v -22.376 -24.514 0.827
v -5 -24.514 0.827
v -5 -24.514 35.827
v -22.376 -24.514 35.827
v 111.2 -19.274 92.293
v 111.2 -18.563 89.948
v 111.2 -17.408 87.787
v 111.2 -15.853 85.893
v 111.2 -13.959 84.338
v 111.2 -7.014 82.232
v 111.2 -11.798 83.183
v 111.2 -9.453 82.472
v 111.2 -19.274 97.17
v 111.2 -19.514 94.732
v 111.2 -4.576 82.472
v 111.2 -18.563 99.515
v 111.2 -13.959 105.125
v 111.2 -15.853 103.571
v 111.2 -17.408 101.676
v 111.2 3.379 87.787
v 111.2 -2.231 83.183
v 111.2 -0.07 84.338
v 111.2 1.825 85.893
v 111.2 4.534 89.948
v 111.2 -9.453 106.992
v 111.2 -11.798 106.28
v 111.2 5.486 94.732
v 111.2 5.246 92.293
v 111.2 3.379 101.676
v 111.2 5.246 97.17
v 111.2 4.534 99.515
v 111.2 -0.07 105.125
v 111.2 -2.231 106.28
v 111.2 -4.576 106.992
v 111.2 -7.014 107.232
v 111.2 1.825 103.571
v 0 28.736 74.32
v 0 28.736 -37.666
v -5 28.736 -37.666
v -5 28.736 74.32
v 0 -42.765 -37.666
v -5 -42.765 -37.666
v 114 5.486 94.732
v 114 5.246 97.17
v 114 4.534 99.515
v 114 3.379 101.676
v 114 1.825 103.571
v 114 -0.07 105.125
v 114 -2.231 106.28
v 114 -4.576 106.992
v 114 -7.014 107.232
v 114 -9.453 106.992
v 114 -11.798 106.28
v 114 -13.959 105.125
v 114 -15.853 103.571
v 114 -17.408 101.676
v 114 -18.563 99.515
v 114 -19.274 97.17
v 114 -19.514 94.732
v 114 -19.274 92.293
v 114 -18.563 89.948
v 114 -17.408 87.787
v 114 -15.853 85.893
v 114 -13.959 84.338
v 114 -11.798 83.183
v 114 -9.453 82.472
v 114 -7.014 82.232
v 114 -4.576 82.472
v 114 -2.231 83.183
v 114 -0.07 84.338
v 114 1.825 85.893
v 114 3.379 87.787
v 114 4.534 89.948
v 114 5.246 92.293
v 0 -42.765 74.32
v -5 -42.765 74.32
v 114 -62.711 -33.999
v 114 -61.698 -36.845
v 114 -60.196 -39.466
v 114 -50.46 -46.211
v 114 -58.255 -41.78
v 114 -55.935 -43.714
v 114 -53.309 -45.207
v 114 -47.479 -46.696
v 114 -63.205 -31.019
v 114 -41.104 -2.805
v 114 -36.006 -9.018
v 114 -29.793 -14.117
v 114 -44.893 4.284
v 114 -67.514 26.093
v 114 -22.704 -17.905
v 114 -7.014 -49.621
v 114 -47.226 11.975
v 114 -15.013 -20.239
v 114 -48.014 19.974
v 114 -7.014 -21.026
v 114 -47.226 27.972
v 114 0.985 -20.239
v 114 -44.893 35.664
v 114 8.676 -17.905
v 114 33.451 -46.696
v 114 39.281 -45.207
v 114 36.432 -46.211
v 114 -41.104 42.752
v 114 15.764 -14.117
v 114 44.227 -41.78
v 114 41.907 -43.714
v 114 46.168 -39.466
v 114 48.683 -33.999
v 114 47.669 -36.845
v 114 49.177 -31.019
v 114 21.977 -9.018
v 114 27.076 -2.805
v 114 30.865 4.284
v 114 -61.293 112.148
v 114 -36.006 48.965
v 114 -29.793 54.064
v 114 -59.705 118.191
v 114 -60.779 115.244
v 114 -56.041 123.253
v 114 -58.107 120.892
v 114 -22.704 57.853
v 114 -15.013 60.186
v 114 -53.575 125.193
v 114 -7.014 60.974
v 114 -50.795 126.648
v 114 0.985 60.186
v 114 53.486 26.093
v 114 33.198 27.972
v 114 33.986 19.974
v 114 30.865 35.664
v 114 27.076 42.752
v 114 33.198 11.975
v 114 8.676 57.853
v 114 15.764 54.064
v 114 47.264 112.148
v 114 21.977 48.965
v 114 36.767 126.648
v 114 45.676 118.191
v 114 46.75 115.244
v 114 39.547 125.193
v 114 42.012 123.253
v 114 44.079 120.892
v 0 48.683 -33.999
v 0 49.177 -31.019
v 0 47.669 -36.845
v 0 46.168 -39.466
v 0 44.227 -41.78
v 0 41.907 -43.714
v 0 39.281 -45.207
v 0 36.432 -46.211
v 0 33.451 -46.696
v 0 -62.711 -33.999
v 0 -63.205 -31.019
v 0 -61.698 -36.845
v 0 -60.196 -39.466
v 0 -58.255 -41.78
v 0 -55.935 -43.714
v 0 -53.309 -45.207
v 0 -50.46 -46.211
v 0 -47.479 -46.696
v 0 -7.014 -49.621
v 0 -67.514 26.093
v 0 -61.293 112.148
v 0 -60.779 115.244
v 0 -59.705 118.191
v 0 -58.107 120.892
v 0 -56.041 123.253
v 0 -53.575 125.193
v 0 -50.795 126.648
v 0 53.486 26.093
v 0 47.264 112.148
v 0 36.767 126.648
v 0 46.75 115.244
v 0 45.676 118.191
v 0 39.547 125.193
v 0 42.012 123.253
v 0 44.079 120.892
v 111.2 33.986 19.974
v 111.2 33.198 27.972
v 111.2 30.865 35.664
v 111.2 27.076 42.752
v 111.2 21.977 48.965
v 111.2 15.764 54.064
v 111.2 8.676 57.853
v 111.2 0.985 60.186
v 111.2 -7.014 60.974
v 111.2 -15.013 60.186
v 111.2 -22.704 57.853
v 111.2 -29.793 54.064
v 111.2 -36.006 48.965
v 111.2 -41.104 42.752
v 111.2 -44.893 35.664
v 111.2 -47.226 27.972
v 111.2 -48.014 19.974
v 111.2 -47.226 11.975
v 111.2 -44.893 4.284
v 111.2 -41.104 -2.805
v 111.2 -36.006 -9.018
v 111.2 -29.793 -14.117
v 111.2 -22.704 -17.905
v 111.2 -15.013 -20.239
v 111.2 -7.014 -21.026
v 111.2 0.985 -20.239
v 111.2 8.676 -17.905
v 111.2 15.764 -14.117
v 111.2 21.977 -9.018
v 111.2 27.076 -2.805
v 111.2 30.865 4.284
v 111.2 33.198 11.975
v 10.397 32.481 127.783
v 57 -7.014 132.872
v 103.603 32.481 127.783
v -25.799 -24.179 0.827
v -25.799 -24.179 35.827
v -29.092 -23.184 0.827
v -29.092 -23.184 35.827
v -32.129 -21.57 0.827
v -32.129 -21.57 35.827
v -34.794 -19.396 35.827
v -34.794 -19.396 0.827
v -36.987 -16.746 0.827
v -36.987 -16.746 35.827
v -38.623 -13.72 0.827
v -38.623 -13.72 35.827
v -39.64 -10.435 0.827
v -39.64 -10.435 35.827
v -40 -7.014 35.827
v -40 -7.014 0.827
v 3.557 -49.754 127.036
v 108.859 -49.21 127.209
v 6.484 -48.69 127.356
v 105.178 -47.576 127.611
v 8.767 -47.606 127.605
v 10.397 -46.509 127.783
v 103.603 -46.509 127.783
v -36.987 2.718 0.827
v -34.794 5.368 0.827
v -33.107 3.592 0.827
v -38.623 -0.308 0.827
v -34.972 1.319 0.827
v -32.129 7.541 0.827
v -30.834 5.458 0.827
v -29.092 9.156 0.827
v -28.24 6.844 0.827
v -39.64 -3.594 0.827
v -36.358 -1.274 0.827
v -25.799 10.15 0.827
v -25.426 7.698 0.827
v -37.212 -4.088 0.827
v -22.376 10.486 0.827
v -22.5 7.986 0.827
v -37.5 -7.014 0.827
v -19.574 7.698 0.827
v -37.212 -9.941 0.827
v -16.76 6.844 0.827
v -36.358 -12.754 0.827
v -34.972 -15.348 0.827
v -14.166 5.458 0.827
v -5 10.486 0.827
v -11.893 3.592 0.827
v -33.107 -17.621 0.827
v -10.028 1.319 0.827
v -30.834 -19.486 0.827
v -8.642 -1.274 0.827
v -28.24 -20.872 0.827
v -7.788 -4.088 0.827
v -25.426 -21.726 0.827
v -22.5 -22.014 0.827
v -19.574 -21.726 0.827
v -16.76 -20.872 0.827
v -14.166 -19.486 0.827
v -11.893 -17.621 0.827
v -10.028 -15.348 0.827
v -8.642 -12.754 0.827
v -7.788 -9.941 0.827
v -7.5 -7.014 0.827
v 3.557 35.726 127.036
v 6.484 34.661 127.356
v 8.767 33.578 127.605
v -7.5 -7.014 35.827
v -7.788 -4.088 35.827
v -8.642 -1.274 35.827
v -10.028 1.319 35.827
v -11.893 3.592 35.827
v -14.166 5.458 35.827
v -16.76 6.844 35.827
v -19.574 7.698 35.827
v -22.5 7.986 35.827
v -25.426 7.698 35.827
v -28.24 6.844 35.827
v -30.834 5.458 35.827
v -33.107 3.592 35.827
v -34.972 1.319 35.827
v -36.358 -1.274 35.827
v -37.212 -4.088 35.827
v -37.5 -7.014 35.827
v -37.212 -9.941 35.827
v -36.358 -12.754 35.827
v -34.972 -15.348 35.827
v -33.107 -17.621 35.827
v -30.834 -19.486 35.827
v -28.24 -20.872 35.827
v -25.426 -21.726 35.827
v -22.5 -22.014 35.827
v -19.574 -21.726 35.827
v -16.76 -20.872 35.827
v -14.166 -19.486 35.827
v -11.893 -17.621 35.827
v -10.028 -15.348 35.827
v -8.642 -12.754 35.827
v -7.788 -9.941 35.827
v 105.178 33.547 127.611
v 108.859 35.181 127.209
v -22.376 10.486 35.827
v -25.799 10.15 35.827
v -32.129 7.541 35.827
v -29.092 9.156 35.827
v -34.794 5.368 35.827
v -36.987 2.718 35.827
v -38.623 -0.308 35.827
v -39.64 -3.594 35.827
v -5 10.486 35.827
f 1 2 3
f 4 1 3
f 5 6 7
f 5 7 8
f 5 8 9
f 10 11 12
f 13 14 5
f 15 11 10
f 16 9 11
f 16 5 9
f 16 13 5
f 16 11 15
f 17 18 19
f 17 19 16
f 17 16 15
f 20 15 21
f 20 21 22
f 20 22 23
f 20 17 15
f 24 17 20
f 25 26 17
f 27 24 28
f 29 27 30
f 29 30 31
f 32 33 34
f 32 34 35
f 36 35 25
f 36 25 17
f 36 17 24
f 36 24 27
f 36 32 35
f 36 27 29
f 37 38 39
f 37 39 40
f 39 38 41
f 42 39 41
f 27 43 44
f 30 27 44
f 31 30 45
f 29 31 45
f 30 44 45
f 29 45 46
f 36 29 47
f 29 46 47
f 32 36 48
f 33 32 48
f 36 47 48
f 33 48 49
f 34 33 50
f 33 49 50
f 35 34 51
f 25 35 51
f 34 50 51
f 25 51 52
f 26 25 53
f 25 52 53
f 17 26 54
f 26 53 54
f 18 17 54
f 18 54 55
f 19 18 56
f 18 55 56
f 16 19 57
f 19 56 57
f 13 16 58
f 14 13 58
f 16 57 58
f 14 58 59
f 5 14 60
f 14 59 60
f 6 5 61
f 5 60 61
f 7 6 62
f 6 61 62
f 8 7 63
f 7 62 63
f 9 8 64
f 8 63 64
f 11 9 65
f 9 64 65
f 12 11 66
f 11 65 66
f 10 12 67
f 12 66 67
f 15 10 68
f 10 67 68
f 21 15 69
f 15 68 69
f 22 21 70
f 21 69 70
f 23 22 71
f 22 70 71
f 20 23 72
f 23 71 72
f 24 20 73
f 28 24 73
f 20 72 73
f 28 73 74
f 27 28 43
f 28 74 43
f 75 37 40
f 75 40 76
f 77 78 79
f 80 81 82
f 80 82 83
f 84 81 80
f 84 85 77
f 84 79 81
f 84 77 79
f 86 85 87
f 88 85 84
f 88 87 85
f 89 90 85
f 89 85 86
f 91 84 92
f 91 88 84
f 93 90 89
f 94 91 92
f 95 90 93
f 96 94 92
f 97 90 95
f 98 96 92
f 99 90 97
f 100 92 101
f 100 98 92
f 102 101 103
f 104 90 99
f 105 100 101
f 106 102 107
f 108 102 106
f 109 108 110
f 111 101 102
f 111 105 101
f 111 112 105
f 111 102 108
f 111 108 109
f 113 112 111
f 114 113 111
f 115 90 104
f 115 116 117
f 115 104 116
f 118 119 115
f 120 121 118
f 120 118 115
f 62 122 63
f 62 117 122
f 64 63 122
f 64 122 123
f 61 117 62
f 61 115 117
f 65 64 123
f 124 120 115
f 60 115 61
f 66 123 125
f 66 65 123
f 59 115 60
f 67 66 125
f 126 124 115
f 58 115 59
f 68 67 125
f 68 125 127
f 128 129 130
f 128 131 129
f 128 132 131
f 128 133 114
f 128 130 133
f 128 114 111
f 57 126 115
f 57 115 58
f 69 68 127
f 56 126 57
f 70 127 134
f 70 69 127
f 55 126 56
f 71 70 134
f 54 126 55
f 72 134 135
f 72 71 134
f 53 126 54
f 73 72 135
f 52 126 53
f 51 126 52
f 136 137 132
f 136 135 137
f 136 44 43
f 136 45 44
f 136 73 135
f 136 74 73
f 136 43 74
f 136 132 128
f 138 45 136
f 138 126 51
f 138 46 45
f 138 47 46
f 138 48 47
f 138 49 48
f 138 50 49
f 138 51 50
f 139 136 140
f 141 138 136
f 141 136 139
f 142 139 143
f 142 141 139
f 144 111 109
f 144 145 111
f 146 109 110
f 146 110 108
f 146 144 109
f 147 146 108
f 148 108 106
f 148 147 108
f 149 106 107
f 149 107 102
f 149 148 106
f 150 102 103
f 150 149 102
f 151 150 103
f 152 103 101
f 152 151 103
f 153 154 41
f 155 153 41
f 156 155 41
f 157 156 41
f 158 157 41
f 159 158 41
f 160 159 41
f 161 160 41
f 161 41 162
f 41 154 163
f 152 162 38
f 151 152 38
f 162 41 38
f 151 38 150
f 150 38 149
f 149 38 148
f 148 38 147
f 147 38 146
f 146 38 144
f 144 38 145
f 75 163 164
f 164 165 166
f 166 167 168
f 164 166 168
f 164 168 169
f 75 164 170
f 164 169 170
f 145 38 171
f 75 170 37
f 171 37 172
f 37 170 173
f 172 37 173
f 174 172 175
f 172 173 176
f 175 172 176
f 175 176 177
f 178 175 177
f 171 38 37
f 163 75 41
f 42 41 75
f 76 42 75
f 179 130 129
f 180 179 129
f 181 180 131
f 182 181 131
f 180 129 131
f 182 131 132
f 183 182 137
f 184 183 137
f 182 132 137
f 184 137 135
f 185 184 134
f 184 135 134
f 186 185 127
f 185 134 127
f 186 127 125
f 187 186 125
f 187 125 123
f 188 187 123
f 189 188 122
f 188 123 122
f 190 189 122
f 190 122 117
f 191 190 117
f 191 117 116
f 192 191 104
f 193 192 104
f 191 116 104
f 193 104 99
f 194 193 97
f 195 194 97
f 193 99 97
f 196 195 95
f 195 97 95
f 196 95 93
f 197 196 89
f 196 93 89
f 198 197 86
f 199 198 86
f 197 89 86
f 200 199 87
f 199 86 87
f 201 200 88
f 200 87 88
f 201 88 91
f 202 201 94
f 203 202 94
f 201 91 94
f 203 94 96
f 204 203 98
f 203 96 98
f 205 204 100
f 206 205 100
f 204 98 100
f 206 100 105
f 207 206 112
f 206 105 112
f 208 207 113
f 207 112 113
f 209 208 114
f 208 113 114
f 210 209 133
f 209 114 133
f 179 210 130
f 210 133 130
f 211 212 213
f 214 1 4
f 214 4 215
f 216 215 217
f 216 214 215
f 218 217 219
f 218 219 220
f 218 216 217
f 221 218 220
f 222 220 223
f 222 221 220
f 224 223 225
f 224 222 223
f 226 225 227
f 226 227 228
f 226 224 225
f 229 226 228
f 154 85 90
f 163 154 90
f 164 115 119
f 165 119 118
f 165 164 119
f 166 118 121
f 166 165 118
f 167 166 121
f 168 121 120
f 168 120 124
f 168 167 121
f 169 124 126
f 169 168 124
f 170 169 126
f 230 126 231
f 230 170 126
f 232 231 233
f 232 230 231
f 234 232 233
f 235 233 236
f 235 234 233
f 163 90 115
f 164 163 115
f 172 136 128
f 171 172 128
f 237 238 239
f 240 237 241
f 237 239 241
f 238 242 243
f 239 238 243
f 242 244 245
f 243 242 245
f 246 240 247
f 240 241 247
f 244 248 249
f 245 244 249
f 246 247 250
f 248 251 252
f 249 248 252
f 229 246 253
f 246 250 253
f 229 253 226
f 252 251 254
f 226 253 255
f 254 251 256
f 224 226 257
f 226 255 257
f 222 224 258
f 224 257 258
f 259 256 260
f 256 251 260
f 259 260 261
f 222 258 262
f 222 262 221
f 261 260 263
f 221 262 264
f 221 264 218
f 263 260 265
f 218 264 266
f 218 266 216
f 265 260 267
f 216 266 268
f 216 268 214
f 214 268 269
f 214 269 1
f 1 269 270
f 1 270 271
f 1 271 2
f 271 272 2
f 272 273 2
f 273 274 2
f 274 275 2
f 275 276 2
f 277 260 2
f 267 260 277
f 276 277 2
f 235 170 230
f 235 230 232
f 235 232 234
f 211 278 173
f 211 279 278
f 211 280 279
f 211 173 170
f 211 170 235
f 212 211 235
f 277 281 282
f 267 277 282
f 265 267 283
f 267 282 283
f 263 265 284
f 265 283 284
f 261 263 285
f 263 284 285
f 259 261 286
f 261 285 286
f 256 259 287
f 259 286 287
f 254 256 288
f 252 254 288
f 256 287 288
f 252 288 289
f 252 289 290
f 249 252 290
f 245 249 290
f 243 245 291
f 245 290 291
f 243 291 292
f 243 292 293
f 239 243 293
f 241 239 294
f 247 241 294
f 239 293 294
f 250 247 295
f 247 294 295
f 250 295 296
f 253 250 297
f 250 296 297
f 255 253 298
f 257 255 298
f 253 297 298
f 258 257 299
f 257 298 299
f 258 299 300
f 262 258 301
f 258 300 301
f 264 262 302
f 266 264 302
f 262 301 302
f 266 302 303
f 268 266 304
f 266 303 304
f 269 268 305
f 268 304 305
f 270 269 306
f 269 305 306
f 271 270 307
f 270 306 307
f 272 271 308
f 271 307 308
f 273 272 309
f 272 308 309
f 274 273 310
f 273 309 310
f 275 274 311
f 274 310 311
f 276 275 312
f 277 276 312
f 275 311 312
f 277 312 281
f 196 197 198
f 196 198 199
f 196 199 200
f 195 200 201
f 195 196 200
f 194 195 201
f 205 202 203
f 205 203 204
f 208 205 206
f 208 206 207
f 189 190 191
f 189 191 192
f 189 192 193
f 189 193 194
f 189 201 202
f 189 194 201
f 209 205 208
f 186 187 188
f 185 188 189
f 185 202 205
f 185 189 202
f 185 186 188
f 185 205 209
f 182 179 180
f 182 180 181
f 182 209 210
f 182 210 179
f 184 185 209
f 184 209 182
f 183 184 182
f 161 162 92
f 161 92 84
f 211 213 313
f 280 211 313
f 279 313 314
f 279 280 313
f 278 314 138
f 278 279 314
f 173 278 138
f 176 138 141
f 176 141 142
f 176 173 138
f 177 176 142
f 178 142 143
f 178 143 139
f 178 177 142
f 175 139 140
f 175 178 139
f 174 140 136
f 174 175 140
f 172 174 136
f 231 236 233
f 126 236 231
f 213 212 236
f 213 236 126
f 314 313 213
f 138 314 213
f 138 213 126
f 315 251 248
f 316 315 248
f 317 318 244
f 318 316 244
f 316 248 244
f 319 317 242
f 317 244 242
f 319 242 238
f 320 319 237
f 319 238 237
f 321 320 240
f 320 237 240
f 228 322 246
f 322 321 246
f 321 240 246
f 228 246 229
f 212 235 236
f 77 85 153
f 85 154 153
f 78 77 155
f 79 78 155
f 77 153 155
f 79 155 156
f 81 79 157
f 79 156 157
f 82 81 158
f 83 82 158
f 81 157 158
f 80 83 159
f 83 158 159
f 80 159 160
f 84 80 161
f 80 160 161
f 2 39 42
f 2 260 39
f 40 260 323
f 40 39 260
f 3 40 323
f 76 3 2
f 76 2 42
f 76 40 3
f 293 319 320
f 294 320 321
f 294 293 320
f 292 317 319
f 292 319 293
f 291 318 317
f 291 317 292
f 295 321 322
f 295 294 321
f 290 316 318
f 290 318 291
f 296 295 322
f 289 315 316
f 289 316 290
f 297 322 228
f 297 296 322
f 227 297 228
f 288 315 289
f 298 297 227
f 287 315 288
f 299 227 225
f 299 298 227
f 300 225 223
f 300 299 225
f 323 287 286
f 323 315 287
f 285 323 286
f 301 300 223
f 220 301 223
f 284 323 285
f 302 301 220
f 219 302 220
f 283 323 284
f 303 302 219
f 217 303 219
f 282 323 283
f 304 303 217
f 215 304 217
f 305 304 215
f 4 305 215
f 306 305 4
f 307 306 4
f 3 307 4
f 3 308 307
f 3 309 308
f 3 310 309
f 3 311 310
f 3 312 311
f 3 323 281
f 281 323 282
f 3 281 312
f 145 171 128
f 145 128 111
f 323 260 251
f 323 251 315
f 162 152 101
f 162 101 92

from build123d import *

# Parameters (mm, degrees)
F0_W         = 121
F0_H         = 195
F1_DEPTH     = 114
F3_DEPTH     = 114
F4_R         = 17
F6_DEPTH     = 134.1
F7_DEPTH     = 135.6
F2_R         = 41
F2_R_2       = 12.5
F8_DEPTH     = 2.8
F9_W         = 71.5012215078
F9_H         = 111.9857653975
F10_DEPTH    = 5
F11_W        = 35
F11_H        = 35
F12_DEPTH    = 35
F13_R        = 15
F14_DEPTH    = 35
F15_T1_DEPTH = 123.1187950266


# Not quite as in the source:
# - a fillet or chamfer that OpenCascade refuses, or shapes differently, is made with other operations: its cross-section is extruded or revolved along the edge and cut away or added


with BuildPart() as f1:
    # F0 (on Right) → F1 (new body)
    with BuildSketch(Plane.YZ):
        with Locations((-7.0141647011, 35.3717551942)):
            Rectangle(F0_W, F0_H)
    extrude(amount=F1_DEPTH)

    # F2 (on face) → F3 (cut, through all)
    with BuildSketch(Plane.YZ.offset(114)):
        Polygon((-60.2907269257, 126.0077205761), (-7.0141647011, 132.8717551942), (-67.5141647011, 132.8717551942), (-67.5141647011, 26.0932128876), align=None)
        Polygon((53.4858352989, 132.8717551942), (-7.0141647011, 132.8717551942), (46.2623975235, 126.0077205761), (53.4858352989, 26.0932128876), align=None)
        Polygon((-62.1019659576, -45.638720619), (-67.5141647011, 26.0932128876), (-67.5141647011, -62.1282448058), (53.4858352989, -62.1282448058), (53.4858352989, 26.0932128876), (48.0736365554, -45.638720619), (-7.0141647011, -49.6213585138), align=None)
    extrude(amount=-F3_DEPTH, mode=Mode.SUBTRACT)

    # F4
    f4_edges = [f1.edges().sort_by_distance(p)[0] for p in [
        (57, -60.290727, 126.007721),
        (57, 46.262398, 126.007721),
        (57, 48.073637, -45.638721),
        (57, -62.101966, -45.638721),
    ]]
    fillet(f4_edges, radius=F4_R)

    # F5 (on Front) → F6 (cut)
    with BuildSketch(Plane.XZ):
        Polygon((56.9999999998, 132.8717551942), (-2e-10, 132.8717551942), (-2e-10, 126.6480237246), align=None)
        Polygon((113.9999999999, 132.8717551942), (56.9999999998, 132.8717551942), (113.9999999999, 126.6480237246), align=None)
    extrude(amount=-F6_DEPTH, mode=Mode.SUBTRACT)

    # F5 (on Front) → F7 (cut)
    with BuildSketch(Plane.XZ):
        Polygon((56.9999999998, 132.8717551942), (-2e-10, 132.8717551942), (-2e-10, 126.6480237246), align=None)
        Polygon((113.9999999999, 132.8717551942), (56.9999999998, 132.8717551942), (113.9999999999, 126.6480237246), align=None)
    extrude(amount=F7_DEPTH, mode=Mode.SUBTRACT)

    # F2 (on face) → F8 (cut)
    with BuildSketch(Plane.YZ.offset(114)):
        with Locations((-7.0141647011, 19.9736393988)):
            Circle(F2_R)
        with Locations((-7.0141647011, 94.7317257524)):
            Circle(F2_R_2)
    extrude(amount=-F8_DEPTH, mode=Mode.SUBTRACT)

    # F9 (on face) → F10 (join)
    with BuildSketch(Plane(origin=(0, 0, 0), x_dir=(0, -1, 0), z_dir=(-1, 0, 0))):
        with Locations((7.0141647011, 18.3268077672)):
            Rectangle(F9_W, F9_H)
    extrude(amount=F10_DEPTH)

    # F11 (on face) → F12 (join)
    with BuildSketch(Plane(origin=(-5, 0, 0), x_dir=(0, -1, 0), z_dir=(-1, 0, 0))):
        with Locations((7.0141647011, 18.3268077672)):
            Rectangle(F11_W, F11_H)
    extrude(amount=F12_DEPTH)

    # F13 (on face) → F14 (cut, through all)
    with BuildSketch(Plane.XY.offset(35.8268077672)):
        with Locations((-22.5, -7.0141647011)):
            Circle(F13_R)
    extrude(amount=-F14_DEPTH, mode=Mode.SUBTRACT)

    # F15: fillet of radius 17.6237590053 on 2 edges, made by hand

    # F15_s2 → F15_t1 (cut)
    with BuildSketch(Plane.XY.offset(-43.2325897462)):
        with BuildLine():
            ThreePointArc((-22.3762409947, -24.5141647011), (-34.8381204973, -19.3522851984), (-40, -6.8904056958))
            Line((-40, -6.8904056958), (-40, -24.5141647011))
            Line((-40, -24.5141647011), (-22.3762409947, -24.5141647011))
        make_face()
        with BuildLine():
            ThreePointArc((-22.3762409947, 10.4858352989), (-34.8381204973, 5.3239557962), (-40, -7.1379237064))
            Line((-40, -7.1379237064), (-40, 10.4858352989))
            Line((-40, 10.4858352989), (-22.3762409947, 10.4858352989))
        make_face()
    extrude(amount=F15_T1_DEPTH, mode=Mode.SUBTRACT)


solid = f1.part
